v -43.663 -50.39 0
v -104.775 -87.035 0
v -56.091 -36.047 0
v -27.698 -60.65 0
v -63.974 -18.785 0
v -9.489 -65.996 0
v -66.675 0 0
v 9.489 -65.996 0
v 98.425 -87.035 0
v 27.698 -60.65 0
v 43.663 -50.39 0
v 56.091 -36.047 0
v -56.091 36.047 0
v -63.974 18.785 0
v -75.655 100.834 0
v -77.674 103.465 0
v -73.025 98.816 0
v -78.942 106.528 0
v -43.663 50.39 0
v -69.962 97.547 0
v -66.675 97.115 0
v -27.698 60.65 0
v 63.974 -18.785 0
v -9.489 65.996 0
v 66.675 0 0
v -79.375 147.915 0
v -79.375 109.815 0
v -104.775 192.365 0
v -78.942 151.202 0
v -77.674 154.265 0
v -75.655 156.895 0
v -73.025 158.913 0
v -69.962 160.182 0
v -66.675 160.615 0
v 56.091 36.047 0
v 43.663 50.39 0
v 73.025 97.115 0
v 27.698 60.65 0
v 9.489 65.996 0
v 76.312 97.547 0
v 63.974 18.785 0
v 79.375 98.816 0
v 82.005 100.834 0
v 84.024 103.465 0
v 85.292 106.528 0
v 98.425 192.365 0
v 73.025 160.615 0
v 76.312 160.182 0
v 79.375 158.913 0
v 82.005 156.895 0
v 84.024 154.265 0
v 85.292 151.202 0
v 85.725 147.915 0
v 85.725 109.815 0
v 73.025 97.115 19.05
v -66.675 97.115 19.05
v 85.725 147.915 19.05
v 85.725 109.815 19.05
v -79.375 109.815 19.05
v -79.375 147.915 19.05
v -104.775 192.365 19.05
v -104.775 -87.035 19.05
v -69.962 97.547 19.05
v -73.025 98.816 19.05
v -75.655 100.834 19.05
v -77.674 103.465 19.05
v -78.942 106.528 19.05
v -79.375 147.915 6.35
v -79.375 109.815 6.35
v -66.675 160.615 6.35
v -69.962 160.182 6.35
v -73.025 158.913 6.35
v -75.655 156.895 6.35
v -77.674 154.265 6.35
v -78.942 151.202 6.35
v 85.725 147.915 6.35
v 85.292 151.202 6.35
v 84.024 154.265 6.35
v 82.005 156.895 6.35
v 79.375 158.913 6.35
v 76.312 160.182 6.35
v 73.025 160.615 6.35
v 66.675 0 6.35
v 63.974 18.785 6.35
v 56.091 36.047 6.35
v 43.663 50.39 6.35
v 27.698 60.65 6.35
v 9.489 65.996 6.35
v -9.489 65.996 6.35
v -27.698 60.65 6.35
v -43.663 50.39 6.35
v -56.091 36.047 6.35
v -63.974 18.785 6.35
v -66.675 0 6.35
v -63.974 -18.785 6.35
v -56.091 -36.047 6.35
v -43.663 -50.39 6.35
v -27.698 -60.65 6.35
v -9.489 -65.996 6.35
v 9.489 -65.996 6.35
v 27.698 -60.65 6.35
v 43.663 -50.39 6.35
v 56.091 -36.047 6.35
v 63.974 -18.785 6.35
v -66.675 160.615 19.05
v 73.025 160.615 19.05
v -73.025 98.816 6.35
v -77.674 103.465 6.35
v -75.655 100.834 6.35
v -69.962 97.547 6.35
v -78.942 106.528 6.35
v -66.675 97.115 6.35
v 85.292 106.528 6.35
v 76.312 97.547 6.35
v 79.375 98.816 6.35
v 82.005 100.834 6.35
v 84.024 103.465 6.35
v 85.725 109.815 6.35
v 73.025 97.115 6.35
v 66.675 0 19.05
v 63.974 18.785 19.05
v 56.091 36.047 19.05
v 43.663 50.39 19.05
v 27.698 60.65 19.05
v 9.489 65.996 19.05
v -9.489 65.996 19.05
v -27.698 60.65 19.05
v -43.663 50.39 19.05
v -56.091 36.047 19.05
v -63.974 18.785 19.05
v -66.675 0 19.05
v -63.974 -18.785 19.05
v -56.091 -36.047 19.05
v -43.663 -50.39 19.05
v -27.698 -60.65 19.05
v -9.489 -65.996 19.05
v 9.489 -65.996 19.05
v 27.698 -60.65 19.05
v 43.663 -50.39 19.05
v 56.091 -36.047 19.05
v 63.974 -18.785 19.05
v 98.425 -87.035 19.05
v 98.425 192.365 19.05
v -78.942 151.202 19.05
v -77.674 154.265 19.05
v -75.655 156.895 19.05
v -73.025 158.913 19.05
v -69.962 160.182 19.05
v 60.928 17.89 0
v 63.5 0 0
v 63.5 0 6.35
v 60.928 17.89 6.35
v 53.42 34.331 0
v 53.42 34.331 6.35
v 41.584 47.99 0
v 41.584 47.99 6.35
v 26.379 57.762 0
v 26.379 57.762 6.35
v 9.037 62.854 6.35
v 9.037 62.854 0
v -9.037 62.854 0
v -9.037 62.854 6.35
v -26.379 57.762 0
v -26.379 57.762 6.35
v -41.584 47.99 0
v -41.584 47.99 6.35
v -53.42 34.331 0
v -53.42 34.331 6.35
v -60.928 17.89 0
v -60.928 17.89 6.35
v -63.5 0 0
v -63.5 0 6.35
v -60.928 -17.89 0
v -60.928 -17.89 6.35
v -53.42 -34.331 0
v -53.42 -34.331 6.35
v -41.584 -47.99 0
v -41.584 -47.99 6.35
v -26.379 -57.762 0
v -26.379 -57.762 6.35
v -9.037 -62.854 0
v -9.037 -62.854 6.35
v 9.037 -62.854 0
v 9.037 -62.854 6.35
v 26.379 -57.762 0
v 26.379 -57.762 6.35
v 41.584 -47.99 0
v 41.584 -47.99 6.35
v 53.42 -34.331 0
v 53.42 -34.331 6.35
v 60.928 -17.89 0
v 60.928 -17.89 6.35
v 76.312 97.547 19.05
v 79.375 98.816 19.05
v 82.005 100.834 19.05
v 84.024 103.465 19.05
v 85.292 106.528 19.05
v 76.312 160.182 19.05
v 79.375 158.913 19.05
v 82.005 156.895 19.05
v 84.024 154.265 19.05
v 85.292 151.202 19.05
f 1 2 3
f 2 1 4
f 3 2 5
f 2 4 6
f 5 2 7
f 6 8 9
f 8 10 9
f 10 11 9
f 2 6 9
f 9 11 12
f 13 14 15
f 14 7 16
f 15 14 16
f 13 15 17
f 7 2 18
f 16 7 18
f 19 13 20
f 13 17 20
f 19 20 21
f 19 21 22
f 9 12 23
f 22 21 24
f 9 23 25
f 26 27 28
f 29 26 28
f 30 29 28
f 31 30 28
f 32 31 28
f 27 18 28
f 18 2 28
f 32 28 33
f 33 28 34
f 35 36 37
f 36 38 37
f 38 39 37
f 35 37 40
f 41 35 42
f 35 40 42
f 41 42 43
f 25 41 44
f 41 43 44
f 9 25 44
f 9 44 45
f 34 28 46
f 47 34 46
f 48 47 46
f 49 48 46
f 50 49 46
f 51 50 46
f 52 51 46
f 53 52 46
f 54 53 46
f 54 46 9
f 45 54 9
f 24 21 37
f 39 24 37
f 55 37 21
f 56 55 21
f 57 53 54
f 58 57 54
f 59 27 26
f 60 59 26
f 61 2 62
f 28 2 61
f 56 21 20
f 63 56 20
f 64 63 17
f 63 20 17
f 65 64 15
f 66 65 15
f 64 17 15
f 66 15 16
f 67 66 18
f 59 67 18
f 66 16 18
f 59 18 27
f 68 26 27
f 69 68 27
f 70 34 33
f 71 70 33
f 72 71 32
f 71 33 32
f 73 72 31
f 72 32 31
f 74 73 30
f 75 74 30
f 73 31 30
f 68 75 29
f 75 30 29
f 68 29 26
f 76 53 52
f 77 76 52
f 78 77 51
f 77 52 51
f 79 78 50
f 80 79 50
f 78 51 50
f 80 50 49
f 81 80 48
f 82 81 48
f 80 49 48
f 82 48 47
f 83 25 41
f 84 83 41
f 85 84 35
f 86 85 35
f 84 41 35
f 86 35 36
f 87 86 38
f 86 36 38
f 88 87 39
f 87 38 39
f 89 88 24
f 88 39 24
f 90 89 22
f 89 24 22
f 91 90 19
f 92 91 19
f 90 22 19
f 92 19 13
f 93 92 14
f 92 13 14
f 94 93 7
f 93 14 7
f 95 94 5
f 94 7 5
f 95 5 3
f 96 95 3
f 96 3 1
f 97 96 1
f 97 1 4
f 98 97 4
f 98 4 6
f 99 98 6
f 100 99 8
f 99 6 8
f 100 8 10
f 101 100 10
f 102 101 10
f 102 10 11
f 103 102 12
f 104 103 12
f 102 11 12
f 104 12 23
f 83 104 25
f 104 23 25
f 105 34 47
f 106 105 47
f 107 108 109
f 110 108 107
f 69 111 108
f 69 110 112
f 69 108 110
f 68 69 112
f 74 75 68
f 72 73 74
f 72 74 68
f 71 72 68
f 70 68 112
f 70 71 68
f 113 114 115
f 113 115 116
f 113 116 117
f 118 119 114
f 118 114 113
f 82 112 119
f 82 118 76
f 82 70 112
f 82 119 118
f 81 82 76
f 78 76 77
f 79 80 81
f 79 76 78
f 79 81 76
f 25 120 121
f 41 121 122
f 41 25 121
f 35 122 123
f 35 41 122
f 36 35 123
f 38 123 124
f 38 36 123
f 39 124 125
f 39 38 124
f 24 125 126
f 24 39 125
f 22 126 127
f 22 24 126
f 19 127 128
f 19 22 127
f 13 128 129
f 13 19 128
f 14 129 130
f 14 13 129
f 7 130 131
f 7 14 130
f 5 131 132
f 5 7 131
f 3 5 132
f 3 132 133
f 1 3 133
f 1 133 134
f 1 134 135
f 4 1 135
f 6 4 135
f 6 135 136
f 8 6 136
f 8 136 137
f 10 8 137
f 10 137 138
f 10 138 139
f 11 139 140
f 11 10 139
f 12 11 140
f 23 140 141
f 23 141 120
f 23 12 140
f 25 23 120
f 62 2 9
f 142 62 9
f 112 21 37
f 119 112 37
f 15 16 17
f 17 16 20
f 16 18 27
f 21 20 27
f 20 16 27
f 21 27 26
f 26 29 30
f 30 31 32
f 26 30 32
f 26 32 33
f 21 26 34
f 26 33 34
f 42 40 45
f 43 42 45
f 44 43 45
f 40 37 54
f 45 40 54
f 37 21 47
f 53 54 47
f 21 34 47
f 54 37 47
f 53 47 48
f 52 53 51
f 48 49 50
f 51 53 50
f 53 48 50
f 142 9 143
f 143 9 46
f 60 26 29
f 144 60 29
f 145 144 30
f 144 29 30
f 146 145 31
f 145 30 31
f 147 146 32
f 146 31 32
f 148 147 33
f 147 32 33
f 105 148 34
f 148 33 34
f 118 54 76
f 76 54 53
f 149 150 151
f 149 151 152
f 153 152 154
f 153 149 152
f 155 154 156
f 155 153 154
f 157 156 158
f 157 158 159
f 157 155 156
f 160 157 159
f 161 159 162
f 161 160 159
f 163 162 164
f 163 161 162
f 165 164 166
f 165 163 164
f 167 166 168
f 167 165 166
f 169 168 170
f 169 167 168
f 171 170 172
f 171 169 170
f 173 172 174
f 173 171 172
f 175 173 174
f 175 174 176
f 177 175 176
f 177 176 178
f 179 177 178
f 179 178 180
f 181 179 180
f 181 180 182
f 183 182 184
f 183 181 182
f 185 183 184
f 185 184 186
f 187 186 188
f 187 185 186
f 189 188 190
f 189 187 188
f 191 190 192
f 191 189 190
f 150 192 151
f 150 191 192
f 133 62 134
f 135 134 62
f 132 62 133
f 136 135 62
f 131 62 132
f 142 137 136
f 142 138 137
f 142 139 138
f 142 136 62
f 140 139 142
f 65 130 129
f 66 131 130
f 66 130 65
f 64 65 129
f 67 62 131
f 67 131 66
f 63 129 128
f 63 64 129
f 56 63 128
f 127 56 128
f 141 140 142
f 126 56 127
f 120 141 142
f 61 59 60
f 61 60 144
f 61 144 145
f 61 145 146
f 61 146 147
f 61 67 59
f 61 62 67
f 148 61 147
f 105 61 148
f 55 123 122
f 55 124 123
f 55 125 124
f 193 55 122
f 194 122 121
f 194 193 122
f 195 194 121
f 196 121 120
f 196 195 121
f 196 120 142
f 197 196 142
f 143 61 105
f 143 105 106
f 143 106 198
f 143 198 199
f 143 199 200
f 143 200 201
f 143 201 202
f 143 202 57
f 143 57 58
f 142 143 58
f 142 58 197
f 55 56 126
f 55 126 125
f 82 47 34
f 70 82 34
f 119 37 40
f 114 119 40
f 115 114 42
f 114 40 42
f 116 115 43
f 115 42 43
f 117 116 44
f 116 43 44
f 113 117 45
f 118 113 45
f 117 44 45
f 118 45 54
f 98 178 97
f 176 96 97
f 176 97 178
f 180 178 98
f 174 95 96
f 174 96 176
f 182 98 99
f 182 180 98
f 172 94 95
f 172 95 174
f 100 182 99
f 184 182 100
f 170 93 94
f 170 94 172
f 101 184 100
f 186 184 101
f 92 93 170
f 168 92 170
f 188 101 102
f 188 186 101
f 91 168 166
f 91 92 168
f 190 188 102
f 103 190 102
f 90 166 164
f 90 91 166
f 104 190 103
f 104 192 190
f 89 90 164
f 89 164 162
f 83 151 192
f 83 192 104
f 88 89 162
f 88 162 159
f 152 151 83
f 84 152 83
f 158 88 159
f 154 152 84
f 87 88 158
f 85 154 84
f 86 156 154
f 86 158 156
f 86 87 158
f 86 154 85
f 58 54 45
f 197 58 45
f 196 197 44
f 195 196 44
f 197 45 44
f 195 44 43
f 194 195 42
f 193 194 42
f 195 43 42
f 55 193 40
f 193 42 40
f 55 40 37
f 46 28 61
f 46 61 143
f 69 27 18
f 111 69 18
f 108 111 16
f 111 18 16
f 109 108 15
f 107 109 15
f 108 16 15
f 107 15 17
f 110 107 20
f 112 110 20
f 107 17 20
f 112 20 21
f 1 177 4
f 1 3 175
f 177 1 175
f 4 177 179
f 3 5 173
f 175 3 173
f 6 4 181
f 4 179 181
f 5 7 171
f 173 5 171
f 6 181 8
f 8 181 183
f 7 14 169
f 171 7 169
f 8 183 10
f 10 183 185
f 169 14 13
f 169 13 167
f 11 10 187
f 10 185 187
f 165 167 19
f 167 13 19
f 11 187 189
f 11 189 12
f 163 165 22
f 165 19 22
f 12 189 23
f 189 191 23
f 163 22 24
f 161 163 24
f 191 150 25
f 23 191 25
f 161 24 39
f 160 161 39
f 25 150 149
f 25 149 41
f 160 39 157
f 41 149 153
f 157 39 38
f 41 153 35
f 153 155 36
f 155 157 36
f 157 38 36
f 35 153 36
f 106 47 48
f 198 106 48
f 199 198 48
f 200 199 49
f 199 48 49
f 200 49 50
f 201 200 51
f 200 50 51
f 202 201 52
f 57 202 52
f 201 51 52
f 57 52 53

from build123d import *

# Parameters (mm, degrees)
F0_R     = 66.675
F0_R_2   = 63.5
F1_DEPTH = 6.35
F0_W     = 203.2
F0_H     = 279.4
F2_DEPTH = 19.05


with BuildPart() as f1:
    # F0 (on Top) → F1 (new body)
    with BuildSketch(Plane.XY):
        Circle(F0_R)
        Circle(F0_R_2, mode=Mode.SUBTRACT)
        with BuildLine():
            Line((73.025, 160.614605), (-66.675, 160.614605))
            ThreePointArc((-66.675, 160.614605), (-75.655256, 156.894861), (-79.375, 147.914605))
            Line((-79.375, 147.914605), (-79.375, 109.814605))
            ThreePointArc((-79.375, 109.814605), (-75.655256, 100.834349), (-66.675, 97.114605))
            Line((-66.675, 97.114605), (73.025, 97.114605))
            ThreePointArc((73.025, 97.114605), (82.005256, 100.834349), (85.725, 109.814605))
            Line((85.725, 109.814605), (85.725, 147.914605))
            ThreePointArc((85.725, 147.914605), (82.005256, 156.894861), (73.025, 160.614605))
        make_face()
    extrude(amount=F1_DEPTH)


with BuildPart() as f2:
    # F0 (on Top) → F2 (new body)
    with BuildSketch(Plane.XY):
        with Locations((-3.175, 52.664605)):
            Rectangle(F0_W, F0_H)
        Circle(F0_R, mode=Mode.SUBTRACT)
        with BuildLine():
            ThreePointArc((-79.375, 147.914605), (-75.655256, 156.894861), (-66.675, 160.614605))
            Line((-66.675, 160.614605), (73.025, 160.614605))
            ThreePointArc((73.025, 160.614605), (82.005256, 156.894861), (85.725, 147.914605))
            Line((85.725, 147.914605), (85.725, 109.814605))
            ThreePointArc((85.725, 109.814605), (82.005256, 100.834349), (73.025, 97.114605))
            Line((73.025, 97.114605), (-66.675, 97.114605))
            ThreePointArc((-66.675, 97.114605), (-75.655256, 100.834349), (-79.375, 109.814605))
            Line((-79.375, 109.814605), (-79.375, 147.914605))
        make_face(mode=Mode.SUBTRACT)
    extrude(amount=F2_DEPTH)


solid = Compound([f1.part, f2.part])
